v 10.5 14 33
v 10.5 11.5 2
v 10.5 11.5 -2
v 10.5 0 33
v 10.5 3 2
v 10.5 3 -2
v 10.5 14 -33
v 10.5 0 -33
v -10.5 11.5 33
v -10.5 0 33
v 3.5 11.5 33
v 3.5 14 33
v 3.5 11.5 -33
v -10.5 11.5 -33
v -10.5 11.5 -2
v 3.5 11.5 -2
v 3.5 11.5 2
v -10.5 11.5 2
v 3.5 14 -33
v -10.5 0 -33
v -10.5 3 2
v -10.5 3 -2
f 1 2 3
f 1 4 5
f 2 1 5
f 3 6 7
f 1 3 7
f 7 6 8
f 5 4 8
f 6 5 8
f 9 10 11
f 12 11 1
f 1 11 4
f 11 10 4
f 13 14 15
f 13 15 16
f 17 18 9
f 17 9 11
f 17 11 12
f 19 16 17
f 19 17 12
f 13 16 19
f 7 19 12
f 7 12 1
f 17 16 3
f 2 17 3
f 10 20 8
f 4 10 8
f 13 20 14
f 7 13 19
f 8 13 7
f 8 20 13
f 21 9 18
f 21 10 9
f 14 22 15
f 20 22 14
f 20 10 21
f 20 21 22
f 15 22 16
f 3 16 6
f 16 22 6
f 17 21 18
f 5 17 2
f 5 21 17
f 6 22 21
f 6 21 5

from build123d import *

# Parameters (mm, degrees)
SK_P01_CARRIER_W             = 21
SK_P01_CARRIER_H             = 66
P01_CARRIER_DEPTH            = 3
P02_WAGO221415GNDSTAR_START  = 3
SK_P02_WAGO221415GNDSTAR_W   = 21
SK_P02_WAGO221415GNDSTAR_H   = 31
P02_WAGO221415GNDSTAR_DEPTH  = 8.5
P03_WAGO221415PACKNODE_START = 3
SK_P03_WAGO221415PACKNODE_W  = 21
SK_P03_WAGO221415PACKNODE_H  = 31
P03_WAGO221415PACKNODE_DEPTH = 8.5
P04_LEVERS_START             = 11.5
SK_P04_LEVERS_W              = 7
SK_P04_LEVERS_H              = 66
P04_LEVERS_DEPTH             = 2.5


with BuildPart() as part:
    # SK_P01_Carrier → P01_Carrier (new body)
    with BuildSketch(Plane(origin=(0, 0, 0), x_dir=(1, 0, 0), z_dir=(0, 1, 0))):
        Rectangle(SK_P01_CARRIER_W, SK_P01_CARRIER_H)
    extrude(amount=P01_CARRIER_DEPTH)

    # SK_P02_WAGO221415GNDstar → P02_WAGO221415GNDstar (add)
    with BuildSketch(Plane(origin=(0, 0, 0), x_dir=(1, 0, 0), z_dir=(0, 1, 0)).offset(P02_WAGO221415GNDSTAR_START)):
        with Locations((0, 17.5)):
            Rectangle(SK_P02_WAGO221415GNDSTAR_W, SK_P02_WAGO221415GNDSTAR_H)
    extrude(amount=P02_WAGO221415GNDSTAR_DEPTH)

    # SK_P03_WAGO221415packnode → P03_WAGO221415packnode (add)
    with BuildSketch(Plane(origin=(0, 0, 0), x_dir=(1, 0, 0), z_dir=(0, 1, 0)).offset(P03_WAGO221415PACKNODE_START)):
        with Locations((0, -17.5)):
            Rectangle(SK_P03_WAGO221415PACKNODE_W, SK_P03_WAGO221415PACKNODE_H)
    extrude(amount=P03_WAGO221415PACKNODE_DEPTH)

    # SK_P04_Levers → P04_Levers (add)
    with BuildSketch(Plane(origin=(0, 0, 0), x_dir=(1, 0, 0), z_dir=(0, 1, 0)).offset(P04_LEVERS_START)):
        with Locations((7, 0)):
            Rectangle(SK_P04_LEVERS_W, SK_P04_LEVERS_H)
    extrude(amount=P04_LEVERS_DEPTH)


solid = part.part
